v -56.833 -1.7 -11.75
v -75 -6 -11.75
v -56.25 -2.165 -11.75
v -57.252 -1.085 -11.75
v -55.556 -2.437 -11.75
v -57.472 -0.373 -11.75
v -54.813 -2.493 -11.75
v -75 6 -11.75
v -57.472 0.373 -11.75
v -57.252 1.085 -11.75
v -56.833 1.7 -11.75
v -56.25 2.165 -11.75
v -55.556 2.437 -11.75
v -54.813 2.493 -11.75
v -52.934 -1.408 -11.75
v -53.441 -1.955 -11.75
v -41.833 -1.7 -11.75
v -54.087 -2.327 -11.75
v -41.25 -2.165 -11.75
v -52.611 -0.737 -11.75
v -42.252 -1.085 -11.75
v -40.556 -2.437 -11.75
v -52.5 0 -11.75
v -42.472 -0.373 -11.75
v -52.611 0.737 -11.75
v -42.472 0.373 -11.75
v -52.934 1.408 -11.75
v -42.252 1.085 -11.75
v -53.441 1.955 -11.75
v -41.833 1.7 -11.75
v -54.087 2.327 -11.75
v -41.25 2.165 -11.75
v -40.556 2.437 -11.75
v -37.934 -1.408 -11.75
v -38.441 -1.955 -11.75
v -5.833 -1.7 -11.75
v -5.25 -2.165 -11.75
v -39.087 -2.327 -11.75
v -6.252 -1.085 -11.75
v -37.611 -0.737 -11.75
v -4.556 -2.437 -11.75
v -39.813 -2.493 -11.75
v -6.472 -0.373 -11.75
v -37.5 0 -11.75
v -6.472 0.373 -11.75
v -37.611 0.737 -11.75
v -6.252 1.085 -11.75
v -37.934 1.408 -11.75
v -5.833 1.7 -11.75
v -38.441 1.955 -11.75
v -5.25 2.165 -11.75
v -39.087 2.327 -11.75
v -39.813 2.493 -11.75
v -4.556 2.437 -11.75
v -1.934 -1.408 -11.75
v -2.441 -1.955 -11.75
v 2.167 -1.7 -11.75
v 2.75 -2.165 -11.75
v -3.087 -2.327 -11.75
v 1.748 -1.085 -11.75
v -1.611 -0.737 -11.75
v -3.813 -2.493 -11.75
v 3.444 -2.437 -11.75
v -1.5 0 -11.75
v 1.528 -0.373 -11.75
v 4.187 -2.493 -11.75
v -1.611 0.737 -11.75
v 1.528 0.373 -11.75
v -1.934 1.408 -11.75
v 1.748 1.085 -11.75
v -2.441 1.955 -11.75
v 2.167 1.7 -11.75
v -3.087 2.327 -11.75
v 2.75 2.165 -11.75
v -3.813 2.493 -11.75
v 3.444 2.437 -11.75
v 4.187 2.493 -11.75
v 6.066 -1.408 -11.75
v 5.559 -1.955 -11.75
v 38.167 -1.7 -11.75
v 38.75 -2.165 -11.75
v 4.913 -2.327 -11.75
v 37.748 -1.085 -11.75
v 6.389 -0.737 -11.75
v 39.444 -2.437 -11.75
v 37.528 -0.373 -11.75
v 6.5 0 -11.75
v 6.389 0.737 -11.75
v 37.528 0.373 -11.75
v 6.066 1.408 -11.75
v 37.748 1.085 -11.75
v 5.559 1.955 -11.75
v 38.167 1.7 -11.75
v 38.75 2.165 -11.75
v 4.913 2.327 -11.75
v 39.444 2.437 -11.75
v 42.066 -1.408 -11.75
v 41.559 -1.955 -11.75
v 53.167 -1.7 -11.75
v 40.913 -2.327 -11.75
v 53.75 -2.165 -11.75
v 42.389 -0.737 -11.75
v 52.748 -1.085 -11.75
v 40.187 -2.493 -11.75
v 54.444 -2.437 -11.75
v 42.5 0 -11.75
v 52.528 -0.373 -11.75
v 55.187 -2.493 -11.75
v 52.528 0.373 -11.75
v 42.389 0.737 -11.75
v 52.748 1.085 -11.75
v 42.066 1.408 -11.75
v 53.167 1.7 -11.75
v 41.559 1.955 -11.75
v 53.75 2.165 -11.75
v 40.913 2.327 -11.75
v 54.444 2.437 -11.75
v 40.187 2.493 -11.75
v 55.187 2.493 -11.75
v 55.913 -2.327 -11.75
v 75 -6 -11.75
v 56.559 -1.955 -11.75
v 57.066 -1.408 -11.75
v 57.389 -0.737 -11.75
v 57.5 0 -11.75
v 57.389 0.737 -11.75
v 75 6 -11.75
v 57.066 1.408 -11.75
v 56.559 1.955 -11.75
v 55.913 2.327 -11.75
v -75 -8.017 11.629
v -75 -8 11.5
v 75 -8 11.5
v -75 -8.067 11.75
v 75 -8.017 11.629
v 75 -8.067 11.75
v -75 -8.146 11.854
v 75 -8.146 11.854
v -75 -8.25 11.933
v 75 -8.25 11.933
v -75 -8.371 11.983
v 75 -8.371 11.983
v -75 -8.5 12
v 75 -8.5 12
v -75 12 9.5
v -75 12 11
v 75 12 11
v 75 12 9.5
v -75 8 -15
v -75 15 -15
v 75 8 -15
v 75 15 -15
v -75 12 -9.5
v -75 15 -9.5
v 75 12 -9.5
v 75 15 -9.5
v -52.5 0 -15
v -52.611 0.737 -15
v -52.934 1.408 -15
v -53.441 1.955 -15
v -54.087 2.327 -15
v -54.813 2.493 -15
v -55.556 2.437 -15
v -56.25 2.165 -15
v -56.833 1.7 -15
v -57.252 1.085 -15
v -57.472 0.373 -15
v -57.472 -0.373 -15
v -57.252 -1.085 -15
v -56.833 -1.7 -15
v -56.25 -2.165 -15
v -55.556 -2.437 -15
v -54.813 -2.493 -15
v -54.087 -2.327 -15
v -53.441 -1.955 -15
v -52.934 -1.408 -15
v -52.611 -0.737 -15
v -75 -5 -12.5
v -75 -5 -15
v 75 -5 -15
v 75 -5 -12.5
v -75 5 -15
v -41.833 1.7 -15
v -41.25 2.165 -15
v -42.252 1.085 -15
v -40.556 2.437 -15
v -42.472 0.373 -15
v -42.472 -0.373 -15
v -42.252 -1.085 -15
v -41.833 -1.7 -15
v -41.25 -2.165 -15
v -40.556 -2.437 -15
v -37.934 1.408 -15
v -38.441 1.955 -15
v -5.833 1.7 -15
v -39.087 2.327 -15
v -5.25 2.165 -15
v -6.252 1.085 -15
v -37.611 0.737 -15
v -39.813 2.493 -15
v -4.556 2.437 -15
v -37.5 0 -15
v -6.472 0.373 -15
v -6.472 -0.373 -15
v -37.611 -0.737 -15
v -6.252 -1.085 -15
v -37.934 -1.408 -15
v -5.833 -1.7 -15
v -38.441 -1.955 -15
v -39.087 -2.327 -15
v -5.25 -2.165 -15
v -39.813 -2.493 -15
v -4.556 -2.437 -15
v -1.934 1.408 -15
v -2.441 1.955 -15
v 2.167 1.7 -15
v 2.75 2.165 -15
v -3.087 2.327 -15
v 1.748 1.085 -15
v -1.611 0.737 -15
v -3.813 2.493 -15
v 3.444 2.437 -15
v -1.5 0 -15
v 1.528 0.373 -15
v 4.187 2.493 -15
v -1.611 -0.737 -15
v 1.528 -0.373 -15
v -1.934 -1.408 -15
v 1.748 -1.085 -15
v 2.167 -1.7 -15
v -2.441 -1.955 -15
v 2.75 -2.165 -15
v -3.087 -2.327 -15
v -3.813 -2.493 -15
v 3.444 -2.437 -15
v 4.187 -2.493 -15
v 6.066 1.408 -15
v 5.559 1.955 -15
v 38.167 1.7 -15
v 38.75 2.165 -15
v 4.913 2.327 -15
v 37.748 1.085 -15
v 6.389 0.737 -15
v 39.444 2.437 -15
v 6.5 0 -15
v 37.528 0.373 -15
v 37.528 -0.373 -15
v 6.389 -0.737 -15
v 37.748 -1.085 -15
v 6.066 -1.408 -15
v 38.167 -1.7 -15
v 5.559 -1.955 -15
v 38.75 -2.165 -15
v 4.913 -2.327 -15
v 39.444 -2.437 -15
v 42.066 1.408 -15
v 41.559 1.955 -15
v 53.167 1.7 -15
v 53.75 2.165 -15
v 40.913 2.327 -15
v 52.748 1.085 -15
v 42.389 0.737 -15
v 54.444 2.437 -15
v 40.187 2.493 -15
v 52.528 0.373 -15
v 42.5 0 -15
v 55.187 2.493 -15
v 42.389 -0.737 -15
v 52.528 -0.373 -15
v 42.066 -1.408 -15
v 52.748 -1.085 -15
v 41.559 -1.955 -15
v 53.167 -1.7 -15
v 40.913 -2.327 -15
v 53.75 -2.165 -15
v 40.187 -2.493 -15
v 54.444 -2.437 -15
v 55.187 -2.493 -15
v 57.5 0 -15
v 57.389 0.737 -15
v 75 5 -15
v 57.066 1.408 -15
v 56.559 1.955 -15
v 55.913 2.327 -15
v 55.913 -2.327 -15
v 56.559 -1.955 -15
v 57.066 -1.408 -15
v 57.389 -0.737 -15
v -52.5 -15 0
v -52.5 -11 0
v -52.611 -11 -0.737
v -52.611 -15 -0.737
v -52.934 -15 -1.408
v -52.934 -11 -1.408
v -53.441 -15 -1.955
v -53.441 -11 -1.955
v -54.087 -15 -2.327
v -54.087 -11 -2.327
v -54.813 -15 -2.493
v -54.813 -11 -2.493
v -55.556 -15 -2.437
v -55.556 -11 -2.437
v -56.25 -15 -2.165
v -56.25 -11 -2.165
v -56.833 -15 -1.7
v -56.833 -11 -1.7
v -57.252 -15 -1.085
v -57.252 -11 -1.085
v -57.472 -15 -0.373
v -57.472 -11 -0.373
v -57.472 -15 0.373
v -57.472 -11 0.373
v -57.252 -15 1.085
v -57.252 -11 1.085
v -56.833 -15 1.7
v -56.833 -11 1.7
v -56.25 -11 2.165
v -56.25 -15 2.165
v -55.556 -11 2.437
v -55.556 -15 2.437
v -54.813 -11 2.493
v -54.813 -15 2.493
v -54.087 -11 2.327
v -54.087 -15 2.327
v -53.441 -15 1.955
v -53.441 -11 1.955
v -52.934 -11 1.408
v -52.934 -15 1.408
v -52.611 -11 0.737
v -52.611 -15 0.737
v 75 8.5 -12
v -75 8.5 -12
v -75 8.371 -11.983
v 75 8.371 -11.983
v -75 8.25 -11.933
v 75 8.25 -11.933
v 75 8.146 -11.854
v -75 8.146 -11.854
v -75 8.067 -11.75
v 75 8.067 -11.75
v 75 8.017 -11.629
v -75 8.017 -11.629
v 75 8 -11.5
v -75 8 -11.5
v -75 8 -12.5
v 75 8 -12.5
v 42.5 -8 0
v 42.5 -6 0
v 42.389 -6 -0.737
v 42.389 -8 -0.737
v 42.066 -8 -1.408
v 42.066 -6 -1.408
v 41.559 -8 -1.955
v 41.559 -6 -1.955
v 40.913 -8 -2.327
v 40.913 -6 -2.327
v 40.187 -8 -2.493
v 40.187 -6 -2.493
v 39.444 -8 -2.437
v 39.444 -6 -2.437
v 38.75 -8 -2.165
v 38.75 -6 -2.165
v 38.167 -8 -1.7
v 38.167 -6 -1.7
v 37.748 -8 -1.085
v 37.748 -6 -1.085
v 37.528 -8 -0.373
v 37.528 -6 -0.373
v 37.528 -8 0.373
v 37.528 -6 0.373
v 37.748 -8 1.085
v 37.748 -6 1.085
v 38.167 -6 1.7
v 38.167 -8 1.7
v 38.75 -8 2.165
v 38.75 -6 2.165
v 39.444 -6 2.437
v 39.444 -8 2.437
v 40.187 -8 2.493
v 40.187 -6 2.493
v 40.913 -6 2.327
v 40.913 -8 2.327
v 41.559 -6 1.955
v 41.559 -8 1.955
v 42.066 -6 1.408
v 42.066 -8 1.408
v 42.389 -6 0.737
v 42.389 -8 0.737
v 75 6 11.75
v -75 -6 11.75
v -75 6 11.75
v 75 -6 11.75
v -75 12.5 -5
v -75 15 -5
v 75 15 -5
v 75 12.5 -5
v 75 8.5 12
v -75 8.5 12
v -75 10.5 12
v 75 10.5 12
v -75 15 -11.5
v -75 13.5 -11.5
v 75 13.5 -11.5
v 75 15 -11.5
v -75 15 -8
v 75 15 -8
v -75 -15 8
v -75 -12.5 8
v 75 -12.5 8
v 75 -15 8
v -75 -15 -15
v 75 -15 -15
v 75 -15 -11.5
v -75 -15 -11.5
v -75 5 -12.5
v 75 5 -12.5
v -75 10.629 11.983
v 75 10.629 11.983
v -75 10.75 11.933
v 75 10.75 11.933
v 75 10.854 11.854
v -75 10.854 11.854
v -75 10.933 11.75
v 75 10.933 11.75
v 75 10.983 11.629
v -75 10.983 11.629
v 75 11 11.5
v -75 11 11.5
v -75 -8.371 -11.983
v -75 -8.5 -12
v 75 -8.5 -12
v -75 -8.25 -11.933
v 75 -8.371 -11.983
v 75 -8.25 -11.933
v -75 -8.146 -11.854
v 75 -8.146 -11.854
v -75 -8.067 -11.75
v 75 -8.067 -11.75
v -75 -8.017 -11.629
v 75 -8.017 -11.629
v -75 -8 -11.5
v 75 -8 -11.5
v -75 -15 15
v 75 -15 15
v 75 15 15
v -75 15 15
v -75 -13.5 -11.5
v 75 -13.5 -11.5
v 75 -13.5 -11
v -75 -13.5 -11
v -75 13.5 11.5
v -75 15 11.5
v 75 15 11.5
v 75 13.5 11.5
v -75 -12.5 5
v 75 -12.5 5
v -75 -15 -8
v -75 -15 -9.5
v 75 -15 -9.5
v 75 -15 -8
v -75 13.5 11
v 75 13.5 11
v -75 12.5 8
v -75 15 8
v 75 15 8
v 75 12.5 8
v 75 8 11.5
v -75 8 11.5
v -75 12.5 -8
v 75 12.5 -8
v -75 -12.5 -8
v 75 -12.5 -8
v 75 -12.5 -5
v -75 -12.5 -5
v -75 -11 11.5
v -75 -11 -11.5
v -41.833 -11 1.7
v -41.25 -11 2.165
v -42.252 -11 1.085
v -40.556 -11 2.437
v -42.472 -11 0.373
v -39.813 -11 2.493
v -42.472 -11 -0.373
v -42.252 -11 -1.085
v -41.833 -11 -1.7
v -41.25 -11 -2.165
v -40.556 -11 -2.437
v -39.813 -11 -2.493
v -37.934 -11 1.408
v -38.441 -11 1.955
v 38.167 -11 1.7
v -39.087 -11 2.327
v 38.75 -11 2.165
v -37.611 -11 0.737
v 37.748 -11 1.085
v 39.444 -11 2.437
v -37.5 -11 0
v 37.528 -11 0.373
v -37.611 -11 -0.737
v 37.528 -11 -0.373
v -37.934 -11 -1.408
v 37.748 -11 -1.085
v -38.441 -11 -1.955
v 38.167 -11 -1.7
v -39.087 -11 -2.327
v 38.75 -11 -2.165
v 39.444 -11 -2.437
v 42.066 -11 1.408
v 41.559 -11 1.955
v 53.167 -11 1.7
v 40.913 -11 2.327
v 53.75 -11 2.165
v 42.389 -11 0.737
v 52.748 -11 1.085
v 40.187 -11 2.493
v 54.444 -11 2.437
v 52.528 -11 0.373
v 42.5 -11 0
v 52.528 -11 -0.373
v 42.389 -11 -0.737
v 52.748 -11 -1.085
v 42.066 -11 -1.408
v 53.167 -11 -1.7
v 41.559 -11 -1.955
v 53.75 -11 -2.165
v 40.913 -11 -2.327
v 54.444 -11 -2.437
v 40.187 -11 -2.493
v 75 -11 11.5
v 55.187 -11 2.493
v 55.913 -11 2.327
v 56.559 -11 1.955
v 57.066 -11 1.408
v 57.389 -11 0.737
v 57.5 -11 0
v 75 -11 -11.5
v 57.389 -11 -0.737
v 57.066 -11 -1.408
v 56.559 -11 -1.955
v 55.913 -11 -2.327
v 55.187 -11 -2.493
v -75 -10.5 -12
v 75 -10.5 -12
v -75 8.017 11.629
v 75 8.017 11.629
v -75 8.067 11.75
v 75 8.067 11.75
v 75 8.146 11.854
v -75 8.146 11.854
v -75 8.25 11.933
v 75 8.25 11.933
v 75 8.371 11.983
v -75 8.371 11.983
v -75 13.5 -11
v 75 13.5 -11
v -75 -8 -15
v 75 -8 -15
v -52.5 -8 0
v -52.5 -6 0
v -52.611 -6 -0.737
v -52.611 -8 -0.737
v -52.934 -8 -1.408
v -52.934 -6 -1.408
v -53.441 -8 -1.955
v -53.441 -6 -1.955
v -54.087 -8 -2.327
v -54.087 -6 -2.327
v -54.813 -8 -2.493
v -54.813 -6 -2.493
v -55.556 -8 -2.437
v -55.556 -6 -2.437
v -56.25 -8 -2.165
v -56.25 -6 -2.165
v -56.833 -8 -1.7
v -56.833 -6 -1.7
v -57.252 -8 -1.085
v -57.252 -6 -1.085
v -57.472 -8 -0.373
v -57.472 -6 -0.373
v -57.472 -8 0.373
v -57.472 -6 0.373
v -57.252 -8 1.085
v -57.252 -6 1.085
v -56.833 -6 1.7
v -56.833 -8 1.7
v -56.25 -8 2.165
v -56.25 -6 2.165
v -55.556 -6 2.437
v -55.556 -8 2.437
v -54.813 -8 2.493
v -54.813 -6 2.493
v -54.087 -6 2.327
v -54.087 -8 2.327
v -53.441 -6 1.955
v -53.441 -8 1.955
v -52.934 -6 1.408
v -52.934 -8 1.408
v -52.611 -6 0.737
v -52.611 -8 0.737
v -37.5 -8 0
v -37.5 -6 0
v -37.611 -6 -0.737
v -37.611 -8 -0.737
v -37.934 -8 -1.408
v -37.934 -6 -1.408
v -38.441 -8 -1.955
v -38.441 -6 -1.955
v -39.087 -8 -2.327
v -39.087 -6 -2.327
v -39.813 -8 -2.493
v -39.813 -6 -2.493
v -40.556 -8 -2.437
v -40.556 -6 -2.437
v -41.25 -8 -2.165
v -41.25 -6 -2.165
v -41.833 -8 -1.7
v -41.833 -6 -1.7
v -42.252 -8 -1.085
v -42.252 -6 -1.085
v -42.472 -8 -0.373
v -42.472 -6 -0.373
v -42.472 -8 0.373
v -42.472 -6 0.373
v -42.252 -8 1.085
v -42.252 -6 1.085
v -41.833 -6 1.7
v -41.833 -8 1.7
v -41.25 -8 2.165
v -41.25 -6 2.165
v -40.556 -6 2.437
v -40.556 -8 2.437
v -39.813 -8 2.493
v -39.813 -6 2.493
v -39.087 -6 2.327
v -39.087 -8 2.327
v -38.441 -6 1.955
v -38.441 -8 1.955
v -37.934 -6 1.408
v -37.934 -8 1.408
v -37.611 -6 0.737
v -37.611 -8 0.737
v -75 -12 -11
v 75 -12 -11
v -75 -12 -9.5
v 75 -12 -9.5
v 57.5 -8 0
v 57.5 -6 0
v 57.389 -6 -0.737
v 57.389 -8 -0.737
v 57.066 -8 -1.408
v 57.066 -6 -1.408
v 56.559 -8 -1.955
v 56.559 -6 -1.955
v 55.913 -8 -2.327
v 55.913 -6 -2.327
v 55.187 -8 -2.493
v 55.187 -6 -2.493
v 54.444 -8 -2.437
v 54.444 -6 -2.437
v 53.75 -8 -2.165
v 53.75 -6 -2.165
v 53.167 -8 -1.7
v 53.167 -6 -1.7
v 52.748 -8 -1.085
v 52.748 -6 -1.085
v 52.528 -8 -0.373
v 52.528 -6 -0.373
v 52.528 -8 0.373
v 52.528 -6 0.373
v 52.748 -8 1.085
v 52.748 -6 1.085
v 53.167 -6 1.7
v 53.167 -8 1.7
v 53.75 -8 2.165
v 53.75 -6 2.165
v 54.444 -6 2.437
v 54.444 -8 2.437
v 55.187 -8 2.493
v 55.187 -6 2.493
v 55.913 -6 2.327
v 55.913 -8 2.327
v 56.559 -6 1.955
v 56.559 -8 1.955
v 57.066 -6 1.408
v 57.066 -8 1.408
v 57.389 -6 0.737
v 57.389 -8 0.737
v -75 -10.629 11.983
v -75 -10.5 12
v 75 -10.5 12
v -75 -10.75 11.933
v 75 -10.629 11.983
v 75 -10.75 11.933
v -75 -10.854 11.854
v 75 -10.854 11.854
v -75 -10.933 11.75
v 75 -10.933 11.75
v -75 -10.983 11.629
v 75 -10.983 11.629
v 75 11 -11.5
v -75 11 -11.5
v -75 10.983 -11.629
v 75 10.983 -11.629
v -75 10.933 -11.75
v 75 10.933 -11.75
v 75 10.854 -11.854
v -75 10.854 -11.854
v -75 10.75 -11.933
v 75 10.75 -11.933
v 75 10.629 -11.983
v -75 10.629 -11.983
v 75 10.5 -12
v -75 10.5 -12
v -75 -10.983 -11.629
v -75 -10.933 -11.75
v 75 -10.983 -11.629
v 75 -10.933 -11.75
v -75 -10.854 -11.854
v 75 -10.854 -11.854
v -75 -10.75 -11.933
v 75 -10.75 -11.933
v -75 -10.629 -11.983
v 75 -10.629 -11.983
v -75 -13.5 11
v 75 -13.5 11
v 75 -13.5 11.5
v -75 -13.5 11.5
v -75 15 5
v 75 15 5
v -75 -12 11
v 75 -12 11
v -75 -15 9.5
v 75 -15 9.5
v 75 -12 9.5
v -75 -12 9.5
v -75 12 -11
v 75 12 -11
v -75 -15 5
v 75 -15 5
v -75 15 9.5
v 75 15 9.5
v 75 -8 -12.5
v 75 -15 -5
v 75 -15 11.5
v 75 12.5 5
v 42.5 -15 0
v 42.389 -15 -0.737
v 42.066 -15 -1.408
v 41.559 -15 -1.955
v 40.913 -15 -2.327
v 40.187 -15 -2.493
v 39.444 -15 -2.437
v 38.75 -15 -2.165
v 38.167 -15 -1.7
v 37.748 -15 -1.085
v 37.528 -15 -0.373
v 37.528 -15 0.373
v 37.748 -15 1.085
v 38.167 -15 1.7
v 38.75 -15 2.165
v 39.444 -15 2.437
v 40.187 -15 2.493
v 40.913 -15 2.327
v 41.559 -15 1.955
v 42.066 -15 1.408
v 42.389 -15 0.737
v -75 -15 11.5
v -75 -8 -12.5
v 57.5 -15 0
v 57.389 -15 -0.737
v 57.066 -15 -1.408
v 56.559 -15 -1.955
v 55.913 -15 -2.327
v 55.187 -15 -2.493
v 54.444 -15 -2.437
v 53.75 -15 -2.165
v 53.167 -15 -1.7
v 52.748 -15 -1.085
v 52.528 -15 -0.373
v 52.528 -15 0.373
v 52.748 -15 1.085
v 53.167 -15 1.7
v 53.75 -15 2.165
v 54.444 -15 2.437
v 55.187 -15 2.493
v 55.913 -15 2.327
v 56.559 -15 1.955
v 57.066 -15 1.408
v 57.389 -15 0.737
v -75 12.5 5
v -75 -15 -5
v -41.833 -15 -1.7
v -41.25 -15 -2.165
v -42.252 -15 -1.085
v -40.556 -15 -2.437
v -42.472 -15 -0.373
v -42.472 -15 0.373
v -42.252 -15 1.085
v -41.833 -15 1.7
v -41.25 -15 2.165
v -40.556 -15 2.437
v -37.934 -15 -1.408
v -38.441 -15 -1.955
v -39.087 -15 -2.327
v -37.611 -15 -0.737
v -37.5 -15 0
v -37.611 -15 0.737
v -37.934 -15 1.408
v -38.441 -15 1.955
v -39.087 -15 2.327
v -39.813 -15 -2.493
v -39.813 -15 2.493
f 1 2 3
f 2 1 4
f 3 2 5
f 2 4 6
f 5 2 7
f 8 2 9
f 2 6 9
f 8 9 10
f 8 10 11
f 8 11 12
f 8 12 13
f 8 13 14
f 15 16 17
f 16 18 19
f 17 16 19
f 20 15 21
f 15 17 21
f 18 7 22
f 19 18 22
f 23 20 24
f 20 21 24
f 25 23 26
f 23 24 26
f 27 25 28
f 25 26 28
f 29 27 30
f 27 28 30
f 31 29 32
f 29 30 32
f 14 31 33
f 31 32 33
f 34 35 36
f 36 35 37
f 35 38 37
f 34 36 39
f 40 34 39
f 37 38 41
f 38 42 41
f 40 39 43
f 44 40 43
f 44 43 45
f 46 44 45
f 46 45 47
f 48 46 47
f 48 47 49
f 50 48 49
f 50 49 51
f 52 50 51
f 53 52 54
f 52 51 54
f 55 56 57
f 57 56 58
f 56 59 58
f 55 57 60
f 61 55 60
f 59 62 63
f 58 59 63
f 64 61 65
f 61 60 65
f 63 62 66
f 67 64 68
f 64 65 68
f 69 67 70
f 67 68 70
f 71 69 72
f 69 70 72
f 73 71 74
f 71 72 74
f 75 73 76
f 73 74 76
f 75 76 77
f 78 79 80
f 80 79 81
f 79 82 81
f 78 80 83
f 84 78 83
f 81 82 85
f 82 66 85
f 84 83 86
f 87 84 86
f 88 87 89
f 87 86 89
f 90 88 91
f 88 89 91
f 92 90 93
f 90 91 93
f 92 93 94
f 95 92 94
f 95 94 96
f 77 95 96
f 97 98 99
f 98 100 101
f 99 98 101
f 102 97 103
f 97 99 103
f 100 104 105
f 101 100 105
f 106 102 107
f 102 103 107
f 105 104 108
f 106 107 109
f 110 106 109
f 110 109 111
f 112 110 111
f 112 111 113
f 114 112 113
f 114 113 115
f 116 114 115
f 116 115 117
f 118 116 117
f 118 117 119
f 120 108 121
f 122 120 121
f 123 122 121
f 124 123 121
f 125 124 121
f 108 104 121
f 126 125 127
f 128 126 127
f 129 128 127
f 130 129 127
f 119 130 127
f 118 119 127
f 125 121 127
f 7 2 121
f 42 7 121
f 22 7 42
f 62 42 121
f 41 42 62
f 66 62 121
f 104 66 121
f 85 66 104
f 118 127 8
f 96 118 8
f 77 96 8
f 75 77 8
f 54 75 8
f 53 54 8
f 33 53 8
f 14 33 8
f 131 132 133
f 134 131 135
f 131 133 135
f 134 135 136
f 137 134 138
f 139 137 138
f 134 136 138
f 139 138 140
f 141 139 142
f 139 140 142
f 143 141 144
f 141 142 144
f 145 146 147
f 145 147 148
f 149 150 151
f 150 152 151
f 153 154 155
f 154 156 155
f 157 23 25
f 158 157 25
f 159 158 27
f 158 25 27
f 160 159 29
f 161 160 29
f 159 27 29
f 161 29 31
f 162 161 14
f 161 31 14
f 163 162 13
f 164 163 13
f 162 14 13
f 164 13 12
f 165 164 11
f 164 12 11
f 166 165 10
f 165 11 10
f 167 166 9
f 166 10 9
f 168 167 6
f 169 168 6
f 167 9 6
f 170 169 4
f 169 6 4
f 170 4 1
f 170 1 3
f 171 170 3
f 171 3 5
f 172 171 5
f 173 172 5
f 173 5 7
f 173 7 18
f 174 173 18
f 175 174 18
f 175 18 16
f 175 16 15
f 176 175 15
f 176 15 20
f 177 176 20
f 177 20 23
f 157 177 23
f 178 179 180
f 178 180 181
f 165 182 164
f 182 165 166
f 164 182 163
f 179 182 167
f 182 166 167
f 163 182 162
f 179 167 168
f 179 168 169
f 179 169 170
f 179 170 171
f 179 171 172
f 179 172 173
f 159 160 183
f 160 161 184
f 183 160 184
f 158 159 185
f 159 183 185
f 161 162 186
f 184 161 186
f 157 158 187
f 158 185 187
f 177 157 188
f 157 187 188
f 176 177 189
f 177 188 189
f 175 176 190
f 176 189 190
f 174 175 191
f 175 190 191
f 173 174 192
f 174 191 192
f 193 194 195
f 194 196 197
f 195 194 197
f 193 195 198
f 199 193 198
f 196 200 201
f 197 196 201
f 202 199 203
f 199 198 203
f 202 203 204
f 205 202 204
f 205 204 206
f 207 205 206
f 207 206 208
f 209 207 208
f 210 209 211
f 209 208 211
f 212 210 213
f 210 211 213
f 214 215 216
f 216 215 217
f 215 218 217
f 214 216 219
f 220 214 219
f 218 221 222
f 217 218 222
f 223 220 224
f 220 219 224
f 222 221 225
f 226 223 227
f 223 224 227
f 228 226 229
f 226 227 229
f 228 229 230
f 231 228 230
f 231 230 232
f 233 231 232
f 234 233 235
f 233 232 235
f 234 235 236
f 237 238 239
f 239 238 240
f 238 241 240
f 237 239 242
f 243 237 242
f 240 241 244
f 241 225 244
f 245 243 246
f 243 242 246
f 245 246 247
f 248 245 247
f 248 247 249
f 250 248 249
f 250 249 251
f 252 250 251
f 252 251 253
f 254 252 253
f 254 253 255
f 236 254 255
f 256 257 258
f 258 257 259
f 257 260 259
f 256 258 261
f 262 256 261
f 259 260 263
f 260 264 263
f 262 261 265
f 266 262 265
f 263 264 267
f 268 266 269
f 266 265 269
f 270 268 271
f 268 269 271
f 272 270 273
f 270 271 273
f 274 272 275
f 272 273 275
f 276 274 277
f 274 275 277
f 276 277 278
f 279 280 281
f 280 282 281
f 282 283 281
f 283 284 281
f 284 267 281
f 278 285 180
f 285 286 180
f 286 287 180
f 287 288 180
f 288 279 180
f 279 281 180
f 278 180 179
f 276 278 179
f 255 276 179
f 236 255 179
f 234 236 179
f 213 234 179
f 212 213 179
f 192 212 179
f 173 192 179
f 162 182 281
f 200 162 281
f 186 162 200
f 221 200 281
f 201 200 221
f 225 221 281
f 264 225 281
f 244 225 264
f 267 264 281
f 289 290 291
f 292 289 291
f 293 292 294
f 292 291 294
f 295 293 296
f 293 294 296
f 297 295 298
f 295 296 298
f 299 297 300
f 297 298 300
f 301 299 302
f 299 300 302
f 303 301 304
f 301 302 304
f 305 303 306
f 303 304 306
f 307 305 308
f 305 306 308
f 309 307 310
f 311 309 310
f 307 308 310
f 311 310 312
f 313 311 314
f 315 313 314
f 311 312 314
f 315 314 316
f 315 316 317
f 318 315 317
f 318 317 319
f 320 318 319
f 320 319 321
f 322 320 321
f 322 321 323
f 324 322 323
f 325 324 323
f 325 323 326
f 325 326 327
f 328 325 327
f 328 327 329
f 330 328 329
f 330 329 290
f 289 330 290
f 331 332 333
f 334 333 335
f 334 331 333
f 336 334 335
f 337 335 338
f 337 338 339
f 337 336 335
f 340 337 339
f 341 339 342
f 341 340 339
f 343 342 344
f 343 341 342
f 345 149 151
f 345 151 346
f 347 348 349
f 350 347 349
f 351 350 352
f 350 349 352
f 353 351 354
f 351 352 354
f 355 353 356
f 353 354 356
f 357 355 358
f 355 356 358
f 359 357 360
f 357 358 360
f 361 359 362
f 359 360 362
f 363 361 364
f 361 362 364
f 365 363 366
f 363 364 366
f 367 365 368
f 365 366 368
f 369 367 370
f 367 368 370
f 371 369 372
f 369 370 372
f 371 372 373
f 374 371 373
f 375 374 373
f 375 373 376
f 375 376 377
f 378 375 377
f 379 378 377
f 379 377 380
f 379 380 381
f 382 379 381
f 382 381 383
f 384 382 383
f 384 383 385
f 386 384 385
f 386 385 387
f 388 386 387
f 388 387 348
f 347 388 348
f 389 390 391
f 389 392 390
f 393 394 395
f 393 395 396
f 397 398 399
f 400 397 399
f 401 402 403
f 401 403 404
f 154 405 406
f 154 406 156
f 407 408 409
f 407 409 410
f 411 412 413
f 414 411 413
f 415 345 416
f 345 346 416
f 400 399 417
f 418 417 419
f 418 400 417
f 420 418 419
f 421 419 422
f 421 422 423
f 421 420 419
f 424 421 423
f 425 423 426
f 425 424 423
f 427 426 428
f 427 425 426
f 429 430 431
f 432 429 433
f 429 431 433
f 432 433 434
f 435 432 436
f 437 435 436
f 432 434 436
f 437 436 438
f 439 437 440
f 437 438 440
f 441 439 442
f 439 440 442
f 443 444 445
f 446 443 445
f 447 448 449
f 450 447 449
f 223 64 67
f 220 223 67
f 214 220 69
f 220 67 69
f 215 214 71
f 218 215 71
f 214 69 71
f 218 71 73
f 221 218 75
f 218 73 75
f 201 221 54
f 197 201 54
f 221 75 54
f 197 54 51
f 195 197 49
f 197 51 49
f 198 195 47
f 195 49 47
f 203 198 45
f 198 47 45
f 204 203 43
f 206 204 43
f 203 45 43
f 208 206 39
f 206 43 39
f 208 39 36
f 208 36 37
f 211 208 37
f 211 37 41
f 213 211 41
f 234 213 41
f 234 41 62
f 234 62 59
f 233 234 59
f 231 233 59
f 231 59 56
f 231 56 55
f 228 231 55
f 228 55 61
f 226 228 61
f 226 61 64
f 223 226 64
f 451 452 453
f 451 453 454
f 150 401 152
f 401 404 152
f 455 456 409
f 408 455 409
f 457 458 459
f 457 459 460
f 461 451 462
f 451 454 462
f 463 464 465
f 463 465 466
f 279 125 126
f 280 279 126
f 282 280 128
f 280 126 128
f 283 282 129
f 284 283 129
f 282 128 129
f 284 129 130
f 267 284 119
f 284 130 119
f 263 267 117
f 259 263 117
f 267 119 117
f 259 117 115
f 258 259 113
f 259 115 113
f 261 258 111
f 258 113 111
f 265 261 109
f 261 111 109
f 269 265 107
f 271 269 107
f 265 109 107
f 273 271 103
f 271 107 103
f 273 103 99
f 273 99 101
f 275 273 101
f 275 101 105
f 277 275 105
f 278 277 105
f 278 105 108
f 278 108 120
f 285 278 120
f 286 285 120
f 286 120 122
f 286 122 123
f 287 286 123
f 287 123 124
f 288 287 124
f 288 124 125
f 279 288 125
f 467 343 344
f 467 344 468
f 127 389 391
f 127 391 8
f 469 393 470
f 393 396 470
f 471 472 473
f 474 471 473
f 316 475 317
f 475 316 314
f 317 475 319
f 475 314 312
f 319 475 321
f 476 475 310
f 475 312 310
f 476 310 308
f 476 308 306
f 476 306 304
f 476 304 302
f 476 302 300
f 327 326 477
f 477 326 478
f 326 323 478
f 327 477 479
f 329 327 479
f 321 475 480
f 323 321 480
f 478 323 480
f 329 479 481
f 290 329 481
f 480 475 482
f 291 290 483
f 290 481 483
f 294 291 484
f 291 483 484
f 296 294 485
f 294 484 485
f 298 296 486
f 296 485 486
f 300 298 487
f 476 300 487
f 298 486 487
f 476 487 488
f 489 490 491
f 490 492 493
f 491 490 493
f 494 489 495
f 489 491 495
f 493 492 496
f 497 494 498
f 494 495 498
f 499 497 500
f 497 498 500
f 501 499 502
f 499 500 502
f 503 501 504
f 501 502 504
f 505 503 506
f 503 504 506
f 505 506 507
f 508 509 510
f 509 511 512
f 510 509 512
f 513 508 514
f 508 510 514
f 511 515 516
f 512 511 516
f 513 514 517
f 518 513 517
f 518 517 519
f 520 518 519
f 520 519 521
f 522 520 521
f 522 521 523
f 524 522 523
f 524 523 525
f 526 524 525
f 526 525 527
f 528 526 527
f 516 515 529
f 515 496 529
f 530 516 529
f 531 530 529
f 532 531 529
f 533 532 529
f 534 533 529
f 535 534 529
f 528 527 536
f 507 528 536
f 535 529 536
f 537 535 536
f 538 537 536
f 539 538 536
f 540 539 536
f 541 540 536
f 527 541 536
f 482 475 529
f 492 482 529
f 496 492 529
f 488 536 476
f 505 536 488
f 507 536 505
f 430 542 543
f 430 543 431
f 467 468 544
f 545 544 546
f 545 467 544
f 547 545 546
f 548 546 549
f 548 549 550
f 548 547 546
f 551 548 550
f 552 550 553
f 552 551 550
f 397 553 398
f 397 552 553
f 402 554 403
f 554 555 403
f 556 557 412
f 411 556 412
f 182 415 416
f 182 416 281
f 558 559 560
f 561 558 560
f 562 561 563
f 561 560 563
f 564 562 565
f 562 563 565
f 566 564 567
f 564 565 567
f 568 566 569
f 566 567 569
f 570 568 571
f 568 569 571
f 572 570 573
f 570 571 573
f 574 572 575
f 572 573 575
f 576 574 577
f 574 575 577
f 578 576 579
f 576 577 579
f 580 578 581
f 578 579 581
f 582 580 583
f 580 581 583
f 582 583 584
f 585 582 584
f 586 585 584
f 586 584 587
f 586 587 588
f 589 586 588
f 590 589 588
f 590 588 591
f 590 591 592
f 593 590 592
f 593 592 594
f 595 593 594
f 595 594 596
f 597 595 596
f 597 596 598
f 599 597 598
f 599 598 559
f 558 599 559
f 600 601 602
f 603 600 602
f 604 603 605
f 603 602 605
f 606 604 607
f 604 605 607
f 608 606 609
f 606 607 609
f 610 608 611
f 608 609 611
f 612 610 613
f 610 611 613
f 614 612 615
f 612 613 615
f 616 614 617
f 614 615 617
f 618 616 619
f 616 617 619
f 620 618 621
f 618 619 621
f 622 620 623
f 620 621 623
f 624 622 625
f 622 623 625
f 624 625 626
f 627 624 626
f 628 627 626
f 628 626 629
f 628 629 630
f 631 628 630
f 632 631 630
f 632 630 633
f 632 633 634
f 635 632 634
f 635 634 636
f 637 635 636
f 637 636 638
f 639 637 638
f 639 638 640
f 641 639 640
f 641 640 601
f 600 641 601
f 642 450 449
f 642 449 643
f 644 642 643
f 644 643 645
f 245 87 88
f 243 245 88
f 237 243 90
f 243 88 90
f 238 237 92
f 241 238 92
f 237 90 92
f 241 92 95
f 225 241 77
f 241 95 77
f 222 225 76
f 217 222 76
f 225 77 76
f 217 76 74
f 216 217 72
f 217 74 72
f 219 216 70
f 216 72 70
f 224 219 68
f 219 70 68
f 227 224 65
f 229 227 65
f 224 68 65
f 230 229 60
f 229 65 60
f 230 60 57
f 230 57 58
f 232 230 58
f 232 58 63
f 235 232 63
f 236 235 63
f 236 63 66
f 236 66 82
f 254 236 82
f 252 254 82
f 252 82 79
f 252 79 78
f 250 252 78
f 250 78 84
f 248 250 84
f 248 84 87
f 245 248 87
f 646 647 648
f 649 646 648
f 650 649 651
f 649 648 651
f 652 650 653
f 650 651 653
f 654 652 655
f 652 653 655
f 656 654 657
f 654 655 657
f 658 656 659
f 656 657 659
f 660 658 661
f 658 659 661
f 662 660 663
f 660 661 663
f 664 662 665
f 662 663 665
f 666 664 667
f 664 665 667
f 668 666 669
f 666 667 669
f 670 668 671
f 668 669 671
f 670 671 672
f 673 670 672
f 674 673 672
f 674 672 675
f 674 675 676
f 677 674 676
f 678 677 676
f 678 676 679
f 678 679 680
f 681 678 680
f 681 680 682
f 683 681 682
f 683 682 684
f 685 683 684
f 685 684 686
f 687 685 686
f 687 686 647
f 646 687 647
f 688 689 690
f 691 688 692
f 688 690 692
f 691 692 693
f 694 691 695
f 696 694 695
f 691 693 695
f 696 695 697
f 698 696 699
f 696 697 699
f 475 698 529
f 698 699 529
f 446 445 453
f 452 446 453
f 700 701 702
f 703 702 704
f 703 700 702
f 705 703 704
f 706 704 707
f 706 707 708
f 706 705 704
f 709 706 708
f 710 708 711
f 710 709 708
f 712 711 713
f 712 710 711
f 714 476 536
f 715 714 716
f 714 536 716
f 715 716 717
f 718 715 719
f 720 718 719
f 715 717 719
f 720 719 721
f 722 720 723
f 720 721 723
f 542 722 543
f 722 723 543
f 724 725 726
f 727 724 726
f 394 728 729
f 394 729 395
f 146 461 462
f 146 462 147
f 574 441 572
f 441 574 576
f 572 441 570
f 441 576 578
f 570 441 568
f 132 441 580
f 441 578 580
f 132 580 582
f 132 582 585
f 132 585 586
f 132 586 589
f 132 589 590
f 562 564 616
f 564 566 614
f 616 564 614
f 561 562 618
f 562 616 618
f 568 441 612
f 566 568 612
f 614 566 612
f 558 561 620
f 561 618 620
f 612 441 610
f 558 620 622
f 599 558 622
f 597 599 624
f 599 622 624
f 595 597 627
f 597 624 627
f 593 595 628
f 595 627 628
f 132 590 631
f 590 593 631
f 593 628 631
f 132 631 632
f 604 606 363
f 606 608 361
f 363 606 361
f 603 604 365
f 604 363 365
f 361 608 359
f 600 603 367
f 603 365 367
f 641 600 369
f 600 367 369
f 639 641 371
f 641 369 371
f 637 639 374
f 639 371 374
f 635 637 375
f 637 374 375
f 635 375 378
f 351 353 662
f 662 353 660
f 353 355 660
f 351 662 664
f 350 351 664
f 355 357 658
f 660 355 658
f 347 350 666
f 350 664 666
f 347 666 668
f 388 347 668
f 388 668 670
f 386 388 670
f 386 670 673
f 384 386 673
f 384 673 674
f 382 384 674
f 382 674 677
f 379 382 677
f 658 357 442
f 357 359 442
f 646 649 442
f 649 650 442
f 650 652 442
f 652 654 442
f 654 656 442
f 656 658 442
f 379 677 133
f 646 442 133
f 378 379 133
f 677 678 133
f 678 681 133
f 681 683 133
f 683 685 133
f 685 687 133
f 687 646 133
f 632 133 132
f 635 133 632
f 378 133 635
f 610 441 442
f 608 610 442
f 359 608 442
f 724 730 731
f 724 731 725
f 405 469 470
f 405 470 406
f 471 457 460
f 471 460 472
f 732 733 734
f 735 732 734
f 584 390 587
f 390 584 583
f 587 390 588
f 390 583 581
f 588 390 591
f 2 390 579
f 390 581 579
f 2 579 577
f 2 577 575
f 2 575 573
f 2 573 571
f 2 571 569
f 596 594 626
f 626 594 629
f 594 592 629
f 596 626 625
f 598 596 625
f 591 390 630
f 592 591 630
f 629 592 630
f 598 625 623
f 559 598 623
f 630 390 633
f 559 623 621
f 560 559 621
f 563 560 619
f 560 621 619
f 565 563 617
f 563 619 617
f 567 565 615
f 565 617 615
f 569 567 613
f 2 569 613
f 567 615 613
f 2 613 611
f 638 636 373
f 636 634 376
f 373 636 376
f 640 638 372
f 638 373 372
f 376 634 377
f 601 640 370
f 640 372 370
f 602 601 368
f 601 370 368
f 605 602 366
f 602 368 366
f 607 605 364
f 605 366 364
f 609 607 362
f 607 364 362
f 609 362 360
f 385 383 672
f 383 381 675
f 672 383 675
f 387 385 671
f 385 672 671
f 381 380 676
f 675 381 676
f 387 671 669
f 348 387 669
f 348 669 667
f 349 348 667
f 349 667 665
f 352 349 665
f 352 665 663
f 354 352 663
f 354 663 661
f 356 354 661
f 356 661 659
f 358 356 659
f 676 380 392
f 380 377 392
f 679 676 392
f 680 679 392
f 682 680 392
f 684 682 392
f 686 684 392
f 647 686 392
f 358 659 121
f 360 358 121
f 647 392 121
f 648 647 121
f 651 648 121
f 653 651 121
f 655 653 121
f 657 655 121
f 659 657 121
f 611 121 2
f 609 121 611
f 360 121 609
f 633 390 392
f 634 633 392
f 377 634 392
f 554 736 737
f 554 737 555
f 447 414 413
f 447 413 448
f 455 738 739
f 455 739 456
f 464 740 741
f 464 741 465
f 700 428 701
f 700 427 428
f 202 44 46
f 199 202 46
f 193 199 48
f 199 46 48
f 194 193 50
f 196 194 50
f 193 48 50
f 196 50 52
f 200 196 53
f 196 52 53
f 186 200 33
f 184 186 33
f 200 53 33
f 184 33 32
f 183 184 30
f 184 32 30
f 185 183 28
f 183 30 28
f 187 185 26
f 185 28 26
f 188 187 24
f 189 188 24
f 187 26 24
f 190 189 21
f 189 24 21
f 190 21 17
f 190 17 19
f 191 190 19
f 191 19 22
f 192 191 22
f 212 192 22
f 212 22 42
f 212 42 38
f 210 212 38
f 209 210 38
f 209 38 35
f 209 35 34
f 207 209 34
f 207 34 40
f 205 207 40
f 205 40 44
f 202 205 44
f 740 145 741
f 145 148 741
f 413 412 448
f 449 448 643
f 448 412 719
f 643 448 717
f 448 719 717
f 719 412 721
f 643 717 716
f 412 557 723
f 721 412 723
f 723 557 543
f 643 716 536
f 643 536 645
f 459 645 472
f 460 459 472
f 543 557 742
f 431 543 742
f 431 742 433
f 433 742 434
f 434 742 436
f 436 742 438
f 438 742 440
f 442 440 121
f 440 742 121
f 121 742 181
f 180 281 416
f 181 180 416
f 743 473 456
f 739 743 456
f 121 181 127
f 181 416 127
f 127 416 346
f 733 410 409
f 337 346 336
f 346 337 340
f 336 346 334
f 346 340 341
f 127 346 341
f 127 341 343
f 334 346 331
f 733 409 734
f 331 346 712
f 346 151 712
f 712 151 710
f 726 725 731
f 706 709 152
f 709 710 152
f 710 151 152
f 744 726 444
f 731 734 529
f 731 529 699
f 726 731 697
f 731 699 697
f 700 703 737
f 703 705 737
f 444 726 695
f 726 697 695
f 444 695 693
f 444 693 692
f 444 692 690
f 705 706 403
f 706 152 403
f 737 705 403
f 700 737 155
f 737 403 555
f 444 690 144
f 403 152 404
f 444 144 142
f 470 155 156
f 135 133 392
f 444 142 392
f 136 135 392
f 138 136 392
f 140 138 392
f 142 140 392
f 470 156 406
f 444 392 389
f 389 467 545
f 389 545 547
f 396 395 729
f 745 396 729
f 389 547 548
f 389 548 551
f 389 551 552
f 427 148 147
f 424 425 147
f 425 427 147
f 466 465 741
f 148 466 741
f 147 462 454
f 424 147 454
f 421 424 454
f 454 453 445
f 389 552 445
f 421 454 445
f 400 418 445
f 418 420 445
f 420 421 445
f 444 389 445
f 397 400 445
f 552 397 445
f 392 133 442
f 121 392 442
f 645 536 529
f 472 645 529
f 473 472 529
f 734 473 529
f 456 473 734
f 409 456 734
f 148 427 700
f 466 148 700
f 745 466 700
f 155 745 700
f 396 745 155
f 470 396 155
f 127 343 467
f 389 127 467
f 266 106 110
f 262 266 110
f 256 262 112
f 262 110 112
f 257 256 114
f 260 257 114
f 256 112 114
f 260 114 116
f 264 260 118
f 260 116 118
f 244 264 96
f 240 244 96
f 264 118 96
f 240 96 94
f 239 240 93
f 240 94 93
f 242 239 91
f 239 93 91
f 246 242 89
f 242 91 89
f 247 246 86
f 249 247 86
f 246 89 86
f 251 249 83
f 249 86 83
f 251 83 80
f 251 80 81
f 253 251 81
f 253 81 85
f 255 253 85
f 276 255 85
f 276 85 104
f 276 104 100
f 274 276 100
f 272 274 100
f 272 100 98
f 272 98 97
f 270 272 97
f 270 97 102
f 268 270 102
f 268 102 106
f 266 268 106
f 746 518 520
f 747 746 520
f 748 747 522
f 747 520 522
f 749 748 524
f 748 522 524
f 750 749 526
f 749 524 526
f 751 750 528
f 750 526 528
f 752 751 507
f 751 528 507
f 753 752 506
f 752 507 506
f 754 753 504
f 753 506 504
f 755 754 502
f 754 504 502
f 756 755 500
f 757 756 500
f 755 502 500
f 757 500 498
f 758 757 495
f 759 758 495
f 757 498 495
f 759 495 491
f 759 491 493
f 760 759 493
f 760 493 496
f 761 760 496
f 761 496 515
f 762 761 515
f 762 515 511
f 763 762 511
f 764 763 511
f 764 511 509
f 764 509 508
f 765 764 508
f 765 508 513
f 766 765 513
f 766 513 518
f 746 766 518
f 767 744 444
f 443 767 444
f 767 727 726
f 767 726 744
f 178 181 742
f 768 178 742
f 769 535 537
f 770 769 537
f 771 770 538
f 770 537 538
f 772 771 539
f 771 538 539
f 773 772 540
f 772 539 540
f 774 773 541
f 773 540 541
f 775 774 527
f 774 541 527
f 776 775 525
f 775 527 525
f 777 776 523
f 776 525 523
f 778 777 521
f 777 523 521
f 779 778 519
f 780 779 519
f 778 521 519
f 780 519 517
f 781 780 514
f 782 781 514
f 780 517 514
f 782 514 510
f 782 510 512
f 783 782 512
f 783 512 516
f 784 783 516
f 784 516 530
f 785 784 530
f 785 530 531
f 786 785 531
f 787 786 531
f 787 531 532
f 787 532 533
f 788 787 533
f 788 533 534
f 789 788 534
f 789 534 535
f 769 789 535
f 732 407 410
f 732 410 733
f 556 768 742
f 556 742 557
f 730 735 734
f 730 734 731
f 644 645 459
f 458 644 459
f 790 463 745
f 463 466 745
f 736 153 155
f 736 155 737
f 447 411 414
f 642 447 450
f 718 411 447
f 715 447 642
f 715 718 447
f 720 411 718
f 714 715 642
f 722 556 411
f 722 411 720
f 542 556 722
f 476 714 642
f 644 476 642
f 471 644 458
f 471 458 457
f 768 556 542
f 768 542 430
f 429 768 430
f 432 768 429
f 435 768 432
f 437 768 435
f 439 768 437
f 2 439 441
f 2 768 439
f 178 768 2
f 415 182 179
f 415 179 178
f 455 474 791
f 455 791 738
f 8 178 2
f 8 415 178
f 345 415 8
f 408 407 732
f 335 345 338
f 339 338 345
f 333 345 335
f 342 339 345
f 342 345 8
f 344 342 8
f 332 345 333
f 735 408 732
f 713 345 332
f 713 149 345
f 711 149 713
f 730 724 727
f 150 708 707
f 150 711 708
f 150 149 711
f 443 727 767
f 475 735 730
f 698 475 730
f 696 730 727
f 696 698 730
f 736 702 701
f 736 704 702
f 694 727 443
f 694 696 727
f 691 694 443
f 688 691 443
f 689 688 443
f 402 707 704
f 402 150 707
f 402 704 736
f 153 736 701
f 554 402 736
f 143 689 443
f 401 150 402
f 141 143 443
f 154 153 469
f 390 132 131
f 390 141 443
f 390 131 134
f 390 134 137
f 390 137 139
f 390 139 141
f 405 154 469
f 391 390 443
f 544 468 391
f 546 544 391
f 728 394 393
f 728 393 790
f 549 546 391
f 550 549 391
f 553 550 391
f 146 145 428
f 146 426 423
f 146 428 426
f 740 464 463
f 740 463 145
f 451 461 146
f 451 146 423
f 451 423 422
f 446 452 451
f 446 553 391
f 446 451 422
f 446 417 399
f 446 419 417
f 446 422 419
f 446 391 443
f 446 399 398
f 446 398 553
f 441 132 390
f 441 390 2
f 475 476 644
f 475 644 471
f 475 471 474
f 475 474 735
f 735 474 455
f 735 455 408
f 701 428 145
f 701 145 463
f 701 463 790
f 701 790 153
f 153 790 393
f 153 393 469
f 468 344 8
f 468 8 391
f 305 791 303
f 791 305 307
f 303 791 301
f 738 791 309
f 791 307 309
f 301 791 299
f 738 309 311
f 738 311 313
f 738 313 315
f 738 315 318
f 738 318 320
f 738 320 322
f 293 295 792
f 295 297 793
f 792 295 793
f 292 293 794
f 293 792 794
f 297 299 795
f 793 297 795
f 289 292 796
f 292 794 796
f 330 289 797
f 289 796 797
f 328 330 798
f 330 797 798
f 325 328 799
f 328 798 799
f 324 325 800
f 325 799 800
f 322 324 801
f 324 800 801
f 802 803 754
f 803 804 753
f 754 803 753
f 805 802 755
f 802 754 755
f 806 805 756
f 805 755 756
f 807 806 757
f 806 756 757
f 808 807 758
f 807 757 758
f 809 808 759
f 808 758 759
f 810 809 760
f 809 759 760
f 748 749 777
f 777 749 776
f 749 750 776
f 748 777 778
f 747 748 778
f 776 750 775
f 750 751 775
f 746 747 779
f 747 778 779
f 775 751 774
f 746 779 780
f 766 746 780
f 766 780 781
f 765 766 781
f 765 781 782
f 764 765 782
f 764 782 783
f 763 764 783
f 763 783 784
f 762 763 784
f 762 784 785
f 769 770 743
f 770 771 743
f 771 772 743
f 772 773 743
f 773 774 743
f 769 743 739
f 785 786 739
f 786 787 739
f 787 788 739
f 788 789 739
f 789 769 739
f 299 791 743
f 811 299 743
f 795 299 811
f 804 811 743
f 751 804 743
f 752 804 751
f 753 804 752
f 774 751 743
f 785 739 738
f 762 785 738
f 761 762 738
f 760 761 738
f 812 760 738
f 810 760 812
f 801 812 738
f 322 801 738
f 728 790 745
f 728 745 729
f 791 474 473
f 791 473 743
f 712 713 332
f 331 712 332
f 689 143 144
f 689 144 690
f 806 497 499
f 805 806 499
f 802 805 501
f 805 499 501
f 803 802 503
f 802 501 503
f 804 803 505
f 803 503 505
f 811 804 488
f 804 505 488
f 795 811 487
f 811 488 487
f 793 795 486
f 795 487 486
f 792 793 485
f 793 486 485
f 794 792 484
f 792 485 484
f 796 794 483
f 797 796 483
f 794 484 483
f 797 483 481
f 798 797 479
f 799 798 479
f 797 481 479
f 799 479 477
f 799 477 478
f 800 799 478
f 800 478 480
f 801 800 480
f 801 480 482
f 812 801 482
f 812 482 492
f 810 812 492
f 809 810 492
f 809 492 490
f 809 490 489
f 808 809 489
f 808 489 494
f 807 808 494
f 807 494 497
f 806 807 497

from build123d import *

# Parameters (mm, degrees)
SKETCH_1_W             = 23.5
SKETCH_1_H             = 12
EXTRUDE_1_DEPTH        = 75
HOLE_WIZARD_M6_1_D     = 5
HOLE_WIZARD_M6_1_DEPTH = 19
HOLE_WIZARD_M6_1_TIP   = 1.502151548
HOLE_WIZARD_M6_2_D     = 5
HOLE_WIZARD_M6_2_DEPTH = 19
HOLE_WIZARD_M6_2_TIP   = 1.502151548


with BuildPart() as part:
    # 草图1 → 凸台-拉伸1 (new, symmetric)
    with BuildSketch(Plane(origin=(0, 0, 0), x_dir=(0, 0, -1), z_dir=(1, 0, 0))):
        Polygon((-15, 15), (-11.5, 15), (-11.5, 13.5), (-11, 13.5), (-11, 12), (-9.5, 12), (-9.5, 15), (-8, 15), (-8, 12.5), (-5, 12.5), (-5, 15), (5, 15), (5, 12.5), (8, 12.5), (8, 15), (9.5, 15), (9.5, 12), (11, 12), (11, 13.5), (11.5, 13.5), (11.5, 15), (15, 15), (15, 8), (12.5, 8), (12.5, 5), (15, 5), (15, -5), (12.5, -5), (12.5, -8), (15, -8), (15, -15), (11.5, -15), (11.5, -13.5), (11, -13.5), (11, -12), (9.5, -12), (9.5, -15), (8, -15), (8, -12.5), (5, -12.5), (5, -15), (-5, -15), (-5, -12.5), (-8, -12.5), (-8, -15), (-9.5, -15), (-9.5, -12), (-11, -12), (-11, -13.5), (-11.5, -13.5), (-11.5, -15), (-15, -15), align=None)
        with BuildLine():
            Line((12, -10.5), (12, -8.5))
            ThreePointArc((12, -8.5), (11.853553391, -8.146446609), (11.5, -8))
            Line((11.5, -8), (-11.5, -8))
            ThreePointArc((-11.5, -8), (-11.853553391, -8.146446609), (-12, -8.5))
            Line((-12, -8.5), (-12, -10.5))
            ThreePointArc((-12, -10.5), (-11.853553391, -10.853553391), (-11.5, -11))
            Line((-11.5, -11), (11.5, -11))
            ThreePointArc((11.5, -11), (11.853553391, -10.853553391), (12, -10.5))
        make_face(mode=Mode.SUBTRACT)
        with BuildLine():
            Line((-11.5, 11), (11.5, 11))
            ThreePointArc((11.5, 11), (11.853553391, 10.853553391), (12, 10.5))
            Line((12, 10.5), (12, 8.5))
            ThreePointArc((12, 8.5), (11.853553391, 8.146446609), (11.5, 8))
            Line((11.5, 8), (-11.5, 8))
            ThreePointArc((-11.5, 8), (-11.853553391, 8.146446609), (-12, 8.5))
            Line((-12, 8.5), (-12, 10.5))
            ThreePointArc((-12, 10.5), (-11.853553391, 10.853553391), (-11.5, 11))
        make_face(mode=Mode.SUBTRACT)
        Rectangle(SKETCH_1_W, SKETCH_1_H, mode=Mode.SUBTRACT)
    extrude(amount=EXTRUDE_1_DEPTH, both=True)

    # M6 螺纹孔1
    with Locations(Plane(origin=(0, -15, 0), x_dir=(-1, 0, 0), z_dir=(0, -1, 0))):
        with Locations((-55, 0), (-40, 0), (55, 0), (40, 0)):
            Hole(HOLE_WIZARD_M6_1_D / 2, depth=HOLE_WIZARD_M6_1_DEPTH)
            with Locations((0, 0, -(HOLE_WIZARD_M6_1_DEPTH + HOLE_WIZARD_M6_1_TIP / 2))):  # 118° drill point
                Cone(0, HOLE_WIZARD_M6_1_D / 2, HOLE_WIZARD_M6_1_TIP, mode=Mode.SUBTRACT)

    # M6 螺纹孔2
    with Locations(Plane(origin=(0, 0, -15), x_dir=(-1, 0, 0), z_dir=(0, 0, -1))):
        with Locations((-55, 0), (-40, 0), (40, 0), (55, 0), (-4, 0), (4, 0)):
            Hole(HOLE_WIZARD_M6_2_D / 2, depth=HOLE_WIZARD_M6_2_DEPTH)
            with Locations((0, 0, -(HOLE_WIZARD_M6_2_DEPTH + HOLE_WIZARD_M6_2_TIP / 2))):  # 118° drill point
                Cone(0, HOLE_WIZARD_M6_2_D / 2, HOLE_WIZARD_M6_2_TIP, mode=Mode.SUBTRACT)


solid = part.part
